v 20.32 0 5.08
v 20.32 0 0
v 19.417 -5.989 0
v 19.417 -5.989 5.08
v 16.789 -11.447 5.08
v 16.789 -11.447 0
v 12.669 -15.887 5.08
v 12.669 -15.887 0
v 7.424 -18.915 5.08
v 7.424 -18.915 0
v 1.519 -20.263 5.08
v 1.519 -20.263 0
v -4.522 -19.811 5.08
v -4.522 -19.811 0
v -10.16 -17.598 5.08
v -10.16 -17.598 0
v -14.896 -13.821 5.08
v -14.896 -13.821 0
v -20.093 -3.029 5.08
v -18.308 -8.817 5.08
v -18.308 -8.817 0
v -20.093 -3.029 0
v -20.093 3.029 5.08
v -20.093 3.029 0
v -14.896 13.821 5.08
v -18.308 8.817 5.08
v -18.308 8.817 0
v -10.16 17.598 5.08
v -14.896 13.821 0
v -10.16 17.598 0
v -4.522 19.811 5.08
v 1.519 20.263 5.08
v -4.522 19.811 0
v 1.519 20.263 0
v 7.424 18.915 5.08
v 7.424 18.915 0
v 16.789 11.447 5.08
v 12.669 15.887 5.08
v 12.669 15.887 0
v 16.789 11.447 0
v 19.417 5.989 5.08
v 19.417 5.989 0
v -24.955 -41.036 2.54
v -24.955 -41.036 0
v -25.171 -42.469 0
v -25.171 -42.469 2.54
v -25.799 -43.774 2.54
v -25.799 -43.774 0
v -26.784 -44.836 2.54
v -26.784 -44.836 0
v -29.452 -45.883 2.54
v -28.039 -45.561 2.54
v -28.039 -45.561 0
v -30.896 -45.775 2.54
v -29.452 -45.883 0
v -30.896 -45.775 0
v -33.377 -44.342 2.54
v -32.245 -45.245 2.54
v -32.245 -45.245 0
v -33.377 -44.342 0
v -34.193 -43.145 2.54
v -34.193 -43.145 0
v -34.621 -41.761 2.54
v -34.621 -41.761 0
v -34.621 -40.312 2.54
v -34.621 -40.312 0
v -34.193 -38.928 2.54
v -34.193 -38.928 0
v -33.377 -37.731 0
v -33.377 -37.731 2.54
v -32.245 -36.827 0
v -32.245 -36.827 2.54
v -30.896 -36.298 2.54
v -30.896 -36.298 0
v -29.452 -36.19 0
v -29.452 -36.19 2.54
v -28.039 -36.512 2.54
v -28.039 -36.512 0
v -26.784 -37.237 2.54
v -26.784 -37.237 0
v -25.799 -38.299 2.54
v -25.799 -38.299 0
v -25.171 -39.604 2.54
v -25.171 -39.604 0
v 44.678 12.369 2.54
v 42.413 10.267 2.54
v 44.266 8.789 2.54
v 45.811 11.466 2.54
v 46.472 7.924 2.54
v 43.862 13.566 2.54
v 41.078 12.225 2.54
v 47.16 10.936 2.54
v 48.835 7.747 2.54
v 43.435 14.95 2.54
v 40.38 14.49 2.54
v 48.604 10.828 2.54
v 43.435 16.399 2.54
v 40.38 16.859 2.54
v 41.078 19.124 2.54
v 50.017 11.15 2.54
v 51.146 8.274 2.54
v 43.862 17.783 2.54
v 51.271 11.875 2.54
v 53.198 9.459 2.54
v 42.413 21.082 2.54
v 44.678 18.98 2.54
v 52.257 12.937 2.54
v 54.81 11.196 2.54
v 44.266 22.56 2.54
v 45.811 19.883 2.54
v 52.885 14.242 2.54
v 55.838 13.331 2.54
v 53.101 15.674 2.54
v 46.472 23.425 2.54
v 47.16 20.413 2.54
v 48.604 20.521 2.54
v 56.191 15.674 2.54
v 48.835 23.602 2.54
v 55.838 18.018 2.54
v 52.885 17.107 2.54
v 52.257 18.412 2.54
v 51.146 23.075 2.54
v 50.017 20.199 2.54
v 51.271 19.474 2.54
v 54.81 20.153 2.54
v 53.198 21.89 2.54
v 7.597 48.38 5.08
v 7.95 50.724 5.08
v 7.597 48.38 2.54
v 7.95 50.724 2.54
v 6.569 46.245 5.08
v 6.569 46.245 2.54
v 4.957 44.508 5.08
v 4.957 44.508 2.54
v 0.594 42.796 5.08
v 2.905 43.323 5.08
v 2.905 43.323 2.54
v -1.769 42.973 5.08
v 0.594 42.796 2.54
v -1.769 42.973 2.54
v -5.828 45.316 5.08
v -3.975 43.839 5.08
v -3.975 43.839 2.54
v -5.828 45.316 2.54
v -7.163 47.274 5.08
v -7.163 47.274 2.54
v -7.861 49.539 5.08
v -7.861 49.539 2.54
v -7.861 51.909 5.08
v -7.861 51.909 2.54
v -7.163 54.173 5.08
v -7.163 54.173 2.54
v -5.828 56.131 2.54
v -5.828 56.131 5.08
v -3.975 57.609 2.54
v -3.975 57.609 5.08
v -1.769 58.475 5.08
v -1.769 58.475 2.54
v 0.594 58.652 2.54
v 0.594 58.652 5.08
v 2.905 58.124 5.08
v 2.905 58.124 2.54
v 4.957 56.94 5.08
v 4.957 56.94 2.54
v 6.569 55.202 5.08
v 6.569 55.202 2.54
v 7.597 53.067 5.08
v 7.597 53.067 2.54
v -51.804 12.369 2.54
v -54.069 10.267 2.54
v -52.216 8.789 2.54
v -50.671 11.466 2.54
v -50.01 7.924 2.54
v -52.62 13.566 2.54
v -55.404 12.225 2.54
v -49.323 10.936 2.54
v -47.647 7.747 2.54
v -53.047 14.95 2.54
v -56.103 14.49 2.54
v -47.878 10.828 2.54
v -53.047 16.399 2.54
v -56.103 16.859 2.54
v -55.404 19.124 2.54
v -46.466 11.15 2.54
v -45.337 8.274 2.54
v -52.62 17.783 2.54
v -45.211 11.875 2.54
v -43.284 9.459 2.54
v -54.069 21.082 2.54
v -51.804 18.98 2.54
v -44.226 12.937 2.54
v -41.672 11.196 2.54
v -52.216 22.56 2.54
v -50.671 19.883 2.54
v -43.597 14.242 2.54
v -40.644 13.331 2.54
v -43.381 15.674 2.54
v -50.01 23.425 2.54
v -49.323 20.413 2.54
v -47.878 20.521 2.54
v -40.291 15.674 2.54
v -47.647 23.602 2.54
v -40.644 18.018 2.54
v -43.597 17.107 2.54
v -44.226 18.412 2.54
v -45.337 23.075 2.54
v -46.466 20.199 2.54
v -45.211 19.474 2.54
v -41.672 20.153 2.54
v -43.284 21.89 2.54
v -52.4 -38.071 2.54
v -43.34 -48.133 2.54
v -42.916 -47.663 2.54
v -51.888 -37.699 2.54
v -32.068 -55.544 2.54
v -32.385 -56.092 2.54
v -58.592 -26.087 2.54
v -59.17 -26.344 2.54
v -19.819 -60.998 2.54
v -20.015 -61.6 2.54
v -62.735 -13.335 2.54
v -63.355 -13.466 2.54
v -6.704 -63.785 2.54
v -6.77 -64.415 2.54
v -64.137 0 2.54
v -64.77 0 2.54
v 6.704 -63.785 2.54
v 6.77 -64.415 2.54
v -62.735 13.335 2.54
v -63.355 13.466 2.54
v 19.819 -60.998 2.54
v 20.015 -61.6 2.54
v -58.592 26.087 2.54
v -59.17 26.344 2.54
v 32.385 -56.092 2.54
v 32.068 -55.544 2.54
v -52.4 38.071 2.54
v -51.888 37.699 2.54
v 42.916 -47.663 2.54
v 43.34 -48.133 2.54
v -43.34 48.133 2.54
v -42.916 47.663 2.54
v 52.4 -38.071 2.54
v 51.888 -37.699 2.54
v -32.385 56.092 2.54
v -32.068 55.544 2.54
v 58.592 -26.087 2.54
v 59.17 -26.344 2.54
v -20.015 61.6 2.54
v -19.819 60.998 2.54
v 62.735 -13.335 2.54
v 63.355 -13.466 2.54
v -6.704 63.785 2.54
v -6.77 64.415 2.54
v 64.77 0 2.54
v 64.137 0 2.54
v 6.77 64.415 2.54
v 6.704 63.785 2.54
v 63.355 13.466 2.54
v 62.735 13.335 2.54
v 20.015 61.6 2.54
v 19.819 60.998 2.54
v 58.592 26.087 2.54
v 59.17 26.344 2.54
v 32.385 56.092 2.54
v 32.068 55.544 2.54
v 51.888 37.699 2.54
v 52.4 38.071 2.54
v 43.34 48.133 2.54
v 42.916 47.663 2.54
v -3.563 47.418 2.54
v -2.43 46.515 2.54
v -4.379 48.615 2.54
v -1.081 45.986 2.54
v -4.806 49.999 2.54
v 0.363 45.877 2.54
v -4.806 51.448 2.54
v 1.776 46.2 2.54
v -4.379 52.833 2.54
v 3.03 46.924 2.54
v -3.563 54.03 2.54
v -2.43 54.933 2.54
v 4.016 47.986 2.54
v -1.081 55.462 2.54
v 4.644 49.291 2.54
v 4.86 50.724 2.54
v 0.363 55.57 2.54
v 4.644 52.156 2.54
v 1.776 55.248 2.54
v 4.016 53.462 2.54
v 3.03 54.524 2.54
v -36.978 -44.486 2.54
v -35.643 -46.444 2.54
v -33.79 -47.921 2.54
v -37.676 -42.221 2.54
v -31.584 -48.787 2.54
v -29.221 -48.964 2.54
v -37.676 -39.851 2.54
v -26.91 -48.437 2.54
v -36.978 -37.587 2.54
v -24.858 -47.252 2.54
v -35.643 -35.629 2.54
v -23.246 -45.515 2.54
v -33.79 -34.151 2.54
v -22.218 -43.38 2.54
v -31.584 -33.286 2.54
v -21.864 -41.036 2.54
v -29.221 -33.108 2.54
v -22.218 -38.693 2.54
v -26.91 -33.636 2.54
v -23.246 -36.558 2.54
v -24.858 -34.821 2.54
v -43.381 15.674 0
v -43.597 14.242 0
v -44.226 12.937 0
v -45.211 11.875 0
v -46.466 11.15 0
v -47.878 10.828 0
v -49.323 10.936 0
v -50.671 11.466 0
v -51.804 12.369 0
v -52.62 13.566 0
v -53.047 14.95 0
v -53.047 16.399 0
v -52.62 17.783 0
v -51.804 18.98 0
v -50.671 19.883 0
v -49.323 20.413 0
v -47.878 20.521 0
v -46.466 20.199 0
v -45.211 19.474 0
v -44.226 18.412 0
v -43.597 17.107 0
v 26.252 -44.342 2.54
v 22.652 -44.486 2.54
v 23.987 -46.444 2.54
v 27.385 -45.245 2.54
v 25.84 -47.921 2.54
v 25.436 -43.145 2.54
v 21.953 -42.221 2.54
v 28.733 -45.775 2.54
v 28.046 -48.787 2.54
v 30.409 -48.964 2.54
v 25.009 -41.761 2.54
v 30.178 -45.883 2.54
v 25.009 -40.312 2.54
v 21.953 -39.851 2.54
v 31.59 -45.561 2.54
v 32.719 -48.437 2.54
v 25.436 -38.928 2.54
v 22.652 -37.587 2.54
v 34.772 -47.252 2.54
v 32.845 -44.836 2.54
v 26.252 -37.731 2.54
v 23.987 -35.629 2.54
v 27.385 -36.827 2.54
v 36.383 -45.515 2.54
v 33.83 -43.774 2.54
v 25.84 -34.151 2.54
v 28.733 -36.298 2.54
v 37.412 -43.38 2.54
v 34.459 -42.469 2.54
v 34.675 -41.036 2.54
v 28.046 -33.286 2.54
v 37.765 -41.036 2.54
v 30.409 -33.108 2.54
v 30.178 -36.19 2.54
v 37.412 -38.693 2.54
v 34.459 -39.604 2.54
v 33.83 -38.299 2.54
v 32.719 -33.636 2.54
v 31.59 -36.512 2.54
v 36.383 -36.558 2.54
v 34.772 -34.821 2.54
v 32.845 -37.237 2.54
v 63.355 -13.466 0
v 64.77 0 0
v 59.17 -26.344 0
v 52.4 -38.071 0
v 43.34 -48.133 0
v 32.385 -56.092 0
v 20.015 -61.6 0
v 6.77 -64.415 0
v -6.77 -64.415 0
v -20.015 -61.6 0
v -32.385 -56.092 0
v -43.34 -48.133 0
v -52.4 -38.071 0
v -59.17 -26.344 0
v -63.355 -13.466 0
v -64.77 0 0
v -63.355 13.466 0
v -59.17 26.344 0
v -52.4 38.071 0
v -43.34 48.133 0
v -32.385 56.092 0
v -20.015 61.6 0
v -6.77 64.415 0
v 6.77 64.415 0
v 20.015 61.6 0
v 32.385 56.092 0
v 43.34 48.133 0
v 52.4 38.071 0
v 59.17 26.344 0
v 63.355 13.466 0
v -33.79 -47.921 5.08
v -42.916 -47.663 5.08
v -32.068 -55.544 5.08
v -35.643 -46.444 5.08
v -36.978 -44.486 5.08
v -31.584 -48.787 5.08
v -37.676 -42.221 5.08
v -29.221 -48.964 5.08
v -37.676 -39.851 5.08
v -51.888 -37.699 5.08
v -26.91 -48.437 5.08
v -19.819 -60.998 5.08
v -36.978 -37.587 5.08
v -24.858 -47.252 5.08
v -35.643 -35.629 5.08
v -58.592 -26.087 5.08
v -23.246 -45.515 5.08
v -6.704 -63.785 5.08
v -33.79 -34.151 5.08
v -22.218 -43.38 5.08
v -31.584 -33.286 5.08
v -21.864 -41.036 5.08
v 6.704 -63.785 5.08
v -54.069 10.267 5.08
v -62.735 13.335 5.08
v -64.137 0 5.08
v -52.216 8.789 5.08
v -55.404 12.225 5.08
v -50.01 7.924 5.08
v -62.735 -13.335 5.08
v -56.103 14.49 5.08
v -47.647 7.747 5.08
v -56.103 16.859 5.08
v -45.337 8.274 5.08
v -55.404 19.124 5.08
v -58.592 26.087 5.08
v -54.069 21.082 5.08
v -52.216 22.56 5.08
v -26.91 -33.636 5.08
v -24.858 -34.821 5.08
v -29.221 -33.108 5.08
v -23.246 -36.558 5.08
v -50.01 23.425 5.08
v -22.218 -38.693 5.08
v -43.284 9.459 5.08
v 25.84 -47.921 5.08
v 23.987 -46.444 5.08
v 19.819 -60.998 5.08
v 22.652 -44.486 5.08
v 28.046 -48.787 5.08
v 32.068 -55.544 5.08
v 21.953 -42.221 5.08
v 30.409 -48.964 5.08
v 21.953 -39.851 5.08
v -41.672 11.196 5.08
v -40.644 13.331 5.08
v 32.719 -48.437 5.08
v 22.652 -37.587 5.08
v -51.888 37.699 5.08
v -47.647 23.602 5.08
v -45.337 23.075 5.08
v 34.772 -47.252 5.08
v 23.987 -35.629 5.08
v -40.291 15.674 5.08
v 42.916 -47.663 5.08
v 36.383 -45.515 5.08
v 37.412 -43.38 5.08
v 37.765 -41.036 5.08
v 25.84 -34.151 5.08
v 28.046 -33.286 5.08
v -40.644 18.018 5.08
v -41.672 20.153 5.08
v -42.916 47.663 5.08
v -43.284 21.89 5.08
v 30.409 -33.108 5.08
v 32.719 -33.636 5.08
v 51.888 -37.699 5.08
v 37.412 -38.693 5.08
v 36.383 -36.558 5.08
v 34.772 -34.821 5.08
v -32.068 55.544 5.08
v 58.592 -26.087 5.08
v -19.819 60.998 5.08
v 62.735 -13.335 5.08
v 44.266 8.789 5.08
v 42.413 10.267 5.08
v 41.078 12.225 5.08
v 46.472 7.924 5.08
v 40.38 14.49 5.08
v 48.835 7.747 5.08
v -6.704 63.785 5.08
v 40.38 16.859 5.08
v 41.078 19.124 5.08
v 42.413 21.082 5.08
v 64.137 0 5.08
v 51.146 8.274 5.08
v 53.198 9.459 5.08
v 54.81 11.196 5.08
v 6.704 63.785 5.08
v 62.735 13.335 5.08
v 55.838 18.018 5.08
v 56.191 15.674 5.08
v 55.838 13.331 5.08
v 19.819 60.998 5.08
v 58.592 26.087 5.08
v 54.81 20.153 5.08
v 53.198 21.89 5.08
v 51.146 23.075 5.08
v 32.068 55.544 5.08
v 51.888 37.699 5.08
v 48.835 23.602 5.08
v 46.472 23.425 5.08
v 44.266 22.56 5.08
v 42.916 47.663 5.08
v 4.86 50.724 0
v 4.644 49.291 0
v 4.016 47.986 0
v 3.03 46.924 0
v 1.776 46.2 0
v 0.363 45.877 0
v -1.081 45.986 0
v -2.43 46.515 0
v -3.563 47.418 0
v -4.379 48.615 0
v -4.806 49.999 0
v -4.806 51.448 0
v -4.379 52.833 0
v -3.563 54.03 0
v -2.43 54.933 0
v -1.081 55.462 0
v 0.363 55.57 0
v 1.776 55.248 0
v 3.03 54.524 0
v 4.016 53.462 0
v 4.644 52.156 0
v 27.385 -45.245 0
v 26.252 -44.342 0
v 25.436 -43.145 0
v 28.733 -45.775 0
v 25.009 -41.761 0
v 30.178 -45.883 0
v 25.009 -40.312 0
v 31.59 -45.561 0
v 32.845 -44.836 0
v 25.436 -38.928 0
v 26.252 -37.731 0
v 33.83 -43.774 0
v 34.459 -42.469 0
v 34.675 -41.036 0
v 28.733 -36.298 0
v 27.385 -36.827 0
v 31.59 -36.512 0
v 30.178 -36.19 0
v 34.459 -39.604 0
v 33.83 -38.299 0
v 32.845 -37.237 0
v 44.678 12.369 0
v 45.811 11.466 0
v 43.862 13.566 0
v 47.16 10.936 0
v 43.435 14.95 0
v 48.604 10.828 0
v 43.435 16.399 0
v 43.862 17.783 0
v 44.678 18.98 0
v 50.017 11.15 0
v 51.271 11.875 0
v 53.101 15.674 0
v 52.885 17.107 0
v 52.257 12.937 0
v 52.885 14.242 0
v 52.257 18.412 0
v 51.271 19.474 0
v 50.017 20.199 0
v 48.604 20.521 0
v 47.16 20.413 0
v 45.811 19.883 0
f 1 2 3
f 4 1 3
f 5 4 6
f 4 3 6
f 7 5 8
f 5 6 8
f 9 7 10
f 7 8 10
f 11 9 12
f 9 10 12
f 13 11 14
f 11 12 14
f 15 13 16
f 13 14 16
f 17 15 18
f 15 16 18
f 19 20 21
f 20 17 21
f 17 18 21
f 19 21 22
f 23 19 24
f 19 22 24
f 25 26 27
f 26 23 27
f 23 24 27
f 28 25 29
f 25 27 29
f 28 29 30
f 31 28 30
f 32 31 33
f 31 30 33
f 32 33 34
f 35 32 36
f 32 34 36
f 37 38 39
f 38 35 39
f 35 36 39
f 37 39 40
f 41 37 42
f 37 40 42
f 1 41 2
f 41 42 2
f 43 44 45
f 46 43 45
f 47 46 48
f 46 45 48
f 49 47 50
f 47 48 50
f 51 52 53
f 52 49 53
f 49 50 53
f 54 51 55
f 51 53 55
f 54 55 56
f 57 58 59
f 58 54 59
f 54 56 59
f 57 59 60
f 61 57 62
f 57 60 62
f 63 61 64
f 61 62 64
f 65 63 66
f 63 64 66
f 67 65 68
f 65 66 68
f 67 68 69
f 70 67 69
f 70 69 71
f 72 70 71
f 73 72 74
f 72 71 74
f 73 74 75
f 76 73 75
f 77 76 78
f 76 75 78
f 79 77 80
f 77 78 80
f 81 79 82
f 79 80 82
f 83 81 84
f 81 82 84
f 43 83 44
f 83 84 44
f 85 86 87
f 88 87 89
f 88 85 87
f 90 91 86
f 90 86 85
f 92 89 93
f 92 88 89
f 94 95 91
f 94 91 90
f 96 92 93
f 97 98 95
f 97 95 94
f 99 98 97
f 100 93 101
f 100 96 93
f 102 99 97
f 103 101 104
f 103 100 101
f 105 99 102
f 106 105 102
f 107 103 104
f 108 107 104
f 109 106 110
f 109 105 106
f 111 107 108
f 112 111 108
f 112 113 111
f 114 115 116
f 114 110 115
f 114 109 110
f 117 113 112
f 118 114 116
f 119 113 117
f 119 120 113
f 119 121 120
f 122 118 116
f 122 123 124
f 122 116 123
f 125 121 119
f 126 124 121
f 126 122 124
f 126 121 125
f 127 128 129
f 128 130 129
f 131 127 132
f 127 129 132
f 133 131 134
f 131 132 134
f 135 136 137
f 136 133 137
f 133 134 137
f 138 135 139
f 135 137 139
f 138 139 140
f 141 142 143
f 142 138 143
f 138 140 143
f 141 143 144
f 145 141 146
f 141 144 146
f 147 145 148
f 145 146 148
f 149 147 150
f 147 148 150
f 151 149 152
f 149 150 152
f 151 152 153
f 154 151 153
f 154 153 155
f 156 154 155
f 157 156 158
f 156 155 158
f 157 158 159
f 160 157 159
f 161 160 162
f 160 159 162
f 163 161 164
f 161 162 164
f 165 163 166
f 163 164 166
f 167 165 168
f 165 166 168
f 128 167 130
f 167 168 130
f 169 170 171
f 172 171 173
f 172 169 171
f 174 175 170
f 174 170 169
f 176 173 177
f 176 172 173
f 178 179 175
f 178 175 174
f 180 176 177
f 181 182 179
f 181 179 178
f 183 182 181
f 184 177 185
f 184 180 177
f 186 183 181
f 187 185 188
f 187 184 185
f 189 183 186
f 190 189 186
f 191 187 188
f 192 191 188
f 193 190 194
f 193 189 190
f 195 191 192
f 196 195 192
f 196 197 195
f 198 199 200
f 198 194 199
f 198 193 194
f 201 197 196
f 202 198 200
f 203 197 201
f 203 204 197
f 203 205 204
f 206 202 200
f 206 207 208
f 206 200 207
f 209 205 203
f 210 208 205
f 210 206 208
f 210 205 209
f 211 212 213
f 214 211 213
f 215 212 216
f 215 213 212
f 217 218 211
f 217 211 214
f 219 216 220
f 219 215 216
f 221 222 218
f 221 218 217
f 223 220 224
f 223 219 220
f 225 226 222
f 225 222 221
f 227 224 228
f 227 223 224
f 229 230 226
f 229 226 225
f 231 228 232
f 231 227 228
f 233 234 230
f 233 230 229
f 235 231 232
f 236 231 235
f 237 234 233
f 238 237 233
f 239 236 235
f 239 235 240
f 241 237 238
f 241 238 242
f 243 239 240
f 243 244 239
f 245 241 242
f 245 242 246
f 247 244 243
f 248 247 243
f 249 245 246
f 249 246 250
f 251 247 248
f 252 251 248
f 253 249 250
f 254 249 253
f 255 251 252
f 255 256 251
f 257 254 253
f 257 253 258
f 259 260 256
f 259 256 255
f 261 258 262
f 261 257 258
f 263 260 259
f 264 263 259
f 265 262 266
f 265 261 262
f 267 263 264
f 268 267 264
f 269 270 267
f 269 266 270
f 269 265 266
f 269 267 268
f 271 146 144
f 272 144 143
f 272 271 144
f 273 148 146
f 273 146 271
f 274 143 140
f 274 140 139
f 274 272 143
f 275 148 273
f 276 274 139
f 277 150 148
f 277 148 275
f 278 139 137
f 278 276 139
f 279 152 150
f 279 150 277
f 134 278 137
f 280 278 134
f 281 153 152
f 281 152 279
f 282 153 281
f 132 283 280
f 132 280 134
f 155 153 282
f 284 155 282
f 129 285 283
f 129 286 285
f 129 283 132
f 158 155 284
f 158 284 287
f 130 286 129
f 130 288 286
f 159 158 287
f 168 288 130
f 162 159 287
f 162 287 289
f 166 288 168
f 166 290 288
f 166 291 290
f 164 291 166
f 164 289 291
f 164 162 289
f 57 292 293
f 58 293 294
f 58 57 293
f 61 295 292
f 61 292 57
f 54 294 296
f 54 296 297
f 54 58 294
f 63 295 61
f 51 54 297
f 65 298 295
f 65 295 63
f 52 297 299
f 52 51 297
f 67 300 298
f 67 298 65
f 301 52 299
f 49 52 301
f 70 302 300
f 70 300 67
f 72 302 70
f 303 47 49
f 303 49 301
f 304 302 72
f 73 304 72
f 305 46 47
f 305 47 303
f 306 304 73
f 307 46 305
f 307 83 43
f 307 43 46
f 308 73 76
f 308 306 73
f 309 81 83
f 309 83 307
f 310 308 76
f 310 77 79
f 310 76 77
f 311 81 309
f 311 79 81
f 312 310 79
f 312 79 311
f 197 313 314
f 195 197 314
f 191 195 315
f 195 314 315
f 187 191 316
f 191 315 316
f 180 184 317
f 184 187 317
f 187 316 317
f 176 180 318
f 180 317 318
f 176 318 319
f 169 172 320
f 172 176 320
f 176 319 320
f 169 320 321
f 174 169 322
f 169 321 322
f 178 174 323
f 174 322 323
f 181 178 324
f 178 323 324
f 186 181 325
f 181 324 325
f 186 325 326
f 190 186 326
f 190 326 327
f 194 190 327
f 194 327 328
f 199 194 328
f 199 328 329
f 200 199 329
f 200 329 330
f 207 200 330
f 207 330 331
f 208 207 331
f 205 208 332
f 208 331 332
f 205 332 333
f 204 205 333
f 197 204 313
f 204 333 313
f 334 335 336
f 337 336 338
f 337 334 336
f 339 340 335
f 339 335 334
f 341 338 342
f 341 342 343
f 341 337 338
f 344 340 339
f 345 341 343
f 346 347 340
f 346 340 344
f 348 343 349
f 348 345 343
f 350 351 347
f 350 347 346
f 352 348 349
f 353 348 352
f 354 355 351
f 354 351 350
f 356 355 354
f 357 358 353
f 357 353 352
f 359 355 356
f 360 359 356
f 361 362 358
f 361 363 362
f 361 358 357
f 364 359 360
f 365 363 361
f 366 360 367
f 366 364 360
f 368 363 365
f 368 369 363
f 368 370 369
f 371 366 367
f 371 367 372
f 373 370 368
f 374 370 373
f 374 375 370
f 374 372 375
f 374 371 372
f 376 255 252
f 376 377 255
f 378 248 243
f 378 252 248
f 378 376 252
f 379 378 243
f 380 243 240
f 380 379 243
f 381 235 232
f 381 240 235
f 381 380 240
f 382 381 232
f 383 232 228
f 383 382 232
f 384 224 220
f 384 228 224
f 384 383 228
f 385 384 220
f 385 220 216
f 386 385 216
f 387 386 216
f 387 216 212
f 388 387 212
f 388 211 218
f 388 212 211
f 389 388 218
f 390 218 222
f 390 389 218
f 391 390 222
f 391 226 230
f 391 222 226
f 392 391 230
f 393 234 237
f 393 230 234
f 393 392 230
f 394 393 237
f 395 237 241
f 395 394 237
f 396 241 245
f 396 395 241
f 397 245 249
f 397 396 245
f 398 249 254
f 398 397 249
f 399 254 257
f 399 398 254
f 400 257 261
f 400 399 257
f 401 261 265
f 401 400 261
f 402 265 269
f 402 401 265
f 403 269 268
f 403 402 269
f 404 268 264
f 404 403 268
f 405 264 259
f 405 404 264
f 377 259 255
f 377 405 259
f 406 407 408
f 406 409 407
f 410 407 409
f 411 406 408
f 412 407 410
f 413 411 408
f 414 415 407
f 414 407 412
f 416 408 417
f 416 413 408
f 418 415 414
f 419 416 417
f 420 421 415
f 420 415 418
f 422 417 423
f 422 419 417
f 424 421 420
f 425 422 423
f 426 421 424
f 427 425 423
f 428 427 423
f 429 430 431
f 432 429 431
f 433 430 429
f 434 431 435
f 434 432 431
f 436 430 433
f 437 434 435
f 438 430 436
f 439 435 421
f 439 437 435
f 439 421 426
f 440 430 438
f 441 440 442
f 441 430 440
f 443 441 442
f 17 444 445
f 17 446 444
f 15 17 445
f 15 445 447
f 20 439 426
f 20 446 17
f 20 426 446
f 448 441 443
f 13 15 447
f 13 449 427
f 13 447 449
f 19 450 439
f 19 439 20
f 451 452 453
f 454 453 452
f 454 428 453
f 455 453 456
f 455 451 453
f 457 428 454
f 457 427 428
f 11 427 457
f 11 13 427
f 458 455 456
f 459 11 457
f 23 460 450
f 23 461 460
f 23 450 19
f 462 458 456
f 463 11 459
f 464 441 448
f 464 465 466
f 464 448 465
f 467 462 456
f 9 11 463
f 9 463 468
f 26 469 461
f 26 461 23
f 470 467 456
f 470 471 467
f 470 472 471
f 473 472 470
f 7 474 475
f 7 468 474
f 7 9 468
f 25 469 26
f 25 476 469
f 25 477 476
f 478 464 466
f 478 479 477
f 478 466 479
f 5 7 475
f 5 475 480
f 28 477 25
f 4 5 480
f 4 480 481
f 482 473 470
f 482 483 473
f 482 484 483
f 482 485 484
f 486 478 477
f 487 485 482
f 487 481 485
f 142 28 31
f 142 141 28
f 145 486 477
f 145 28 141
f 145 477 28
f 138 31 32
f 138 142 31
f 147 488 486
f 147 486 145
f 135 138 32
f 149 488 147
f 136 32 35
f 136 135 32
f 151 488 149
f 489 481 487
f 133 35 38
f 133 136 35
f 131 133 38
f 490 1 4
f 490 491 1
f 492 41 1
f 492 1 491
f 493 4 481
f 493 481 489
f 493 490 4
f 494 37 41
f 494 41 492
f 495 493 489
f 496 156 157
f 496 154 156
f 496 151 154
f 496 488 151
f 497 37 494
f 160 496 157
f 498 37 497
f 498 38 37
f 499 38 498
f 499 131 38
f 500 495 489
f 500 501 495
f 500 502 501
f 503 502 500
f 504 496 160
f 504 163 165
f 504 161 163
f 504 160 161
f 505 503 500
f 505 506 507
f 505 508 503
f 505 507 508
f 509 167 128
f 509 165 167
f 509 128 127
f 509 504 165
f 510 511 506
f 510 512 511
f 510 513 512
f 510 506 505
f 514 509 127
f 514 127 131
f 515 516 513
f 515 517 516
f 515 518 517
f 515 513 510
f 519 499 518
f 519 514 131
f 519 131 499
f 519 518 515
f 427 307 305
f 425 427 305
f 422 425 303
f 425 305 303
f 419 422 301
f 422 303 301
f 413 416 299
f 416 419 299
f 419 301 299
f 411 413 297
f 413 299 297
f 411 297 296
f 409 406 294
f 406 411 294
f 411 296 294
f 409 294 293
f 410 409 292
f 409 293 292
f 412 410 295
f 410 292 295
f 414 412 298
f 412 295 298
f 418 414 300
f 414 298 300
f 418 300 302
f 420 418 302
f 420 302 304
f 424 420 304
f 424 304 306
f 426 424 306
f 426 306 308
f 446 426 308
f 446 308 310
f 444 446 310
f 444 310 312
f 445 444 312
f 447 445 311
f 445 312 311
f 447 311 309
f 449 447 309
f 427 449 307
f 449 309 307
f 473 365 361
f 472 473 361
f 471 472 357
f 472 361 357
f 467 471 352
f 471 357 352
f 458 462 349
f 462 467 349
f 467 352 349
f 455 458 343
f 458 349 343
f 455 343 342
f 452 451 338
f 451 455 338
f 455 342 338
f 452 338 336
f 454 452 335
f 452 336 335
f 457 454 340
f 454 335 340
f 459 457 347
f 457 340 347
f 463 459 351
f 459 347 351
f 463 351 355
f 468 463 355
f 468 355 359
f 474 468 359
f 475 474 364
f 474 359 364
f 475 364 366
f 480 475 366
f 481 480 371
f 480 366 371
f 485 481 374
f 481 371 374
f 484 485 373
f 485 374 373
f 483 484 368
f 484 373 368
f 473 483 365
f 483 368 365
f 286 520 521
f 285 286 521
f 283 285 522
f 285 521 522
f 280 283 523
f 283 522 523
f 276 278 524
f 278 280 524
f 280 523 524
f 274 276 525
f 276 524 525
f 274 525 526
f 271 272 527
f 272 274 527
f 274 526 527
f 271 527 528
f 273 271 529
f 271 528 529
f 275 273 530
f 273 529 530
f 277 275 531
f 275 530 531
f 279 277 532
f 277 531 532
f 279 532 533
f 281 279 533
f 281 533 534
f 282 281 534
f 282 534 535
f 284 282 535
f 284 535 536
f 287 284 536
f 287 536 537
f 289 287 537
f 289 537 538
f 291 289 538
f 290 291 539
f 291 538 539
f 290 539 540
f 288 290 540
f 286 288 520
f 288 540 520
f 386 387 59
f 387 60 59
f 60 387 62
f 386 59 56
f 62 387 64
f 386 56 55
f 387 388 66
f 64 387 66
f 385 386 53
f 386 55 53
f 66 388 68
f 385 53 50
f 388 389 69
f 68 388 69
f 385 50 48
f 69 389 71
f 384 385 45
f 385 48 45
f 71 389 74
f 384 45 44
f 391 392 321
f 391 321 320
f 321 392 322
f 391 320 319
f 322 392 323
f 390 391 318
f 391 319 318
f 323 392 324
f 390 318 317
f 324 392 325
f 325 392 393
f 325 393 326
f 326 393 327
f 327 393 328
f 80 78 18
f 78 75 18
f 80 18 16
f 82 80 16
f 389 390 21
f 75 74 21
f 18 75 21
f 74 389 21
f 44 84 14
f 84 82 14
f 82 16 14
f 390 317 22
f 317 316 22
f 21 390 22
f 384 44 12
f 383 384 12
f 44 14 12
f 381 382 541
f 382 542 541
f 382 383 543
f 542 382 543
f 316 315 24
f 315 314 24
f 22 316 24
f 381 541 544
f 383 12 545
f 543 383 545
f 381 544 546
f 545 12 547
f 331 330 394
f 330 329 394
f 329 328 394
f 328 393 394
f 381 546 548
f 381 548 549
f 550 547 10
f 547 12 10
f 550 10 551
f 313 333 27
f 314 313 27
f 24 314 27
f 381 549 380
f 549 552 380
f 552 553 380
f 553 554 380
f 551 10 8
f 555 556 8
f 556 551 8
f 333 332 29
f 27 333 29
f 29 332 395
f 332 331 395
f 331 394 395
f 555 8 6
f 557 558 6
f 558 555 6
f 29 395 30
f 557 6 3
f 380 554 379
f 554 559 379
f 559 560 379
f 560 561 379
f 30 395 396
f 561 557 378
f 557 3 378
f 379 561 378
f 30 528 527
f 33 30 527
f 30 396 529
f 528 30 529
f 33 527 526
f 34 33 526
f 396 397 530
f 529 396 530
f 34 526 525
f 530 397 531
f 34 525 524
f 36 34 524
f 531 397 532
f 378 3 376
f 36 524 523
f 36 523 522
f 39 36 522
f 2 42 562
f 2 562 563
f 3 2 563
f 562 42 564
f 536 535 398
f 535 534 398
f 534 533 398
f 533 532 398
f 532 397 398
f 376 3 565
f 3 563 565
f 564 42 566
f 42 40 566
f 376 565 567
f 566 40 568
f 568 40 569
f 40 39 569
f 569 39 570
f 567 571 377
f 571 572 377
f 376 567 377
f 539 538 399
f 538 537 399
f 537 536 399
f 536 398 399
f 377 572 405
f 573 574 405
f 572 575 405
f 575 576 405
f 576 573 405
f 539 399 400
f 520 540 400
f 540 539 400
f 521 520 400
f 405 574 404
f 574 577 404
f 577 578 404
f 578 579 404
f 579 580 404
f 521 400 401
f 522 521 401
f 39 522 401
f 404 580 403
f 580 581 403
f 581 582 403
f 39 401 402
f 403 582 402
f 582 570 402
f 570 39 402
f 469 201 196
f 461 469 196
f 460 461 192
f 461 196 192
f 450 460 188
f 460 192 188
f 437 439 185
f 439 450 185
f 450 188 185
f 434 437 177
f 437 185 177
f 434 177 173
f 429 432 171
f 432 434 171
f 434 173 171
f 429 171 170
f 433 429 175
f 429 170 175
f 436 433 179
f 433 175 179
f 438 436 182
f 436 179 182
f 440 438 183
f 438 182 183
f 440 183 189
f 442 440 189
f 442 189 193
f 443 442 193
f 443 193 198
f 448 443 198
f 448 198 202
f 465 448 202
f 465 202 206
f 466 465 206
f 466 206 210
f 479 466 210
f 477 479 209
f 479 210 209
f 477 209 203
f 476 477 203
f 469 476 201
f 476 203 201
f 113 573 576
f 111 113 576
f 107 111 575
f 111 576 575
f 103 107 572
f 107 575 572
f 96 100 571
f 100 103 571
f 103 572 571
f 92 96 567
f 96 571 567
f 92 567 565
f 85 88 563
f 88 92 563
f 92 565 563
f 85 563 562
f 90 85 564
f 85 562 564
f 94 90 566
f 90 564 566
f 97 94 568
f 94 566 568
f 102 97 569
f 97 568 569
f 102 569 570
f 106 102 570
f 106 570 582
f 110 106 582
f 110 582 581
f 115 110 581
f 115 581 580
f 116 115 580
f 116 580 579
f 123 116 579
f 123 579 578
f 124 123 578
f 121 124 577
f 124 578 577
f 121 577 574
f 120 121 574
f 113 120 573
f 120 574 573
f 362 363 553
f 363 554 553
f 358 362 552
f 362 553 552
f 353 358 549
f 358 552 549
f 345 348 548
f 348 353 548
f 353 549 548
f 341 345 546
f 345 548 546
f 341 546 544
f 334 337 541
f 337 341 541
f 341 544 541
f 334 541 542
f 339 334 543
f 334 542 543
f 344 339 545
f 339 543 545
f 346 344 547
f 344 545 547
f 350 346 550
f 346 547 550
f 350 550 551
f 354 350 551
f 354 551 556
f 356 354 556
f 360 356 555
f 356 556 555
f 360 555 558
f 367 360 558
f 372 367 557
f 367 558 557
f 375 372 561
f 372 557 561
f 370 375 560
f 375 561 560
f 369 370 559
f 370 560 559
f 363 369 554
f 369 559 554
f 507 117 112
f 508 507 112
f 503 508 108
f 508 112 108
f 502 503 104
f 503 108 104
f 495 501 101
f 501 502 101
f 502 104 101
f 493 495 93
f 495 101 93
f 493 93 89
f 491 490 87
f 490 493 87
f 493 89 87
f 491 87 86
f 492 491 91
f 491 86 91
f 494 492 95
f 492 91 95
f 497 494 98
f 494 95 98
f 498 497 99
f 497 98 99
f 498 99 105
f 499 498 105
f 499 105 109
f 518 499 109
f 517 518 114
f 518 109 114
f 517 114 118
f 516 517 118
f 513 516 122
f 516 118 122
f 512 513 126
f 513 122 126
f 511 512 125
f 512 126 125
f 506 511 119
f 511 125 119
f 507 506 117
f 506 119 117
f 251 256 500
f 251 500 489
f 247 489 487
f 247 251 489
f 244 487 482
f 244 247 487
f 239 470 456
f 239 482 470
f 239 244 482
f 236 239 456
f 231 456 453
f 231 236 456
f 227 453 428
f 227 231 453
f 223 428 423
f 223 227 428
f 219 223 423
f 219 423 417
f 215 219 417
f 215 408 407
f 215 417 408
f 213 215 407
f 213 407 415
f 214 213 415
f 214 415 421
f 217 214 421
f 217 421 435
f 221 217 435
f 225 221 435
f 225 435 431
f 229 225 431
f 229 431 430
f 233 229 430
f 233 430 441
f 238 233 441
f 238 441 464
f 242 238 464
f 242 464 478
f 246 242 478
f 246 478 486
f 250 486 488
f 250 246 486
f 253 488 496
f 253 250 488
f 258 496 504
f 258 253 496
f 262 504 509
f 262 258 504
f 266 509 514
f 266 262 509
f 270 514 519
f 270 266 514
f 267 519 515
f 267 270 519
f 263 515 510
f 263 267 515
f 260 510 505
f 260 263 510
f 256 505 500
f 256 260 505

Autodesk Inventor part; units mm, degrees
ref_plane "YZ Plane" through (0, 0, 0) normal (1, 0, 0) x (0, 1, 0)
ref_plane "XZ Plane" through (0, 0, 0) normal (0, 1, 0) x (-1, 0, 0)
ref_plane "XY Plane" through (0, 0, 0) normal (0, 0, 1) x (1, 0, 0)
sketch "Sketch1" plane through (0, 0, 0) normal (0, 0, 1) x (1, 0, 0)
  circle A0 centre (0, 0) radius 20.32
  circle A1 centre (0, 0) radius 64.77
  circle A2 centre (0, 50.7238) radius 4.8601
  circle A3 centre (-48.2412, 15.6745) radius 4.8601
  circle A4 centre (-29.8147, -41.0364) radius 4.8601
  circle A5 centre (29.8147, -41.0364) radius 4.8601
  circle A6 centre (48.2412, 15.6745) radius 4.8601
  dimension "d0" = 40.64
  dimension "d1" = 129.54
  dimension "d2" = 50.7238
  dimension "d5" = 360
extrude "Extrusion1" add sketch "Sketch1" along normal blind 2.54
sketch "Sketch2" plane through (0, 0, 2.54) normal (0, 0, 1) x (1, 0, 0)
  circle A0 centre (0, 0) radius 20.32 projected
  circle A1 centre (0, 0) radius 20.32
  circle A2 centre (0, 0) radius 64.1368
  circle A3 centre (0, 50.7238) radius 4.8601 projected
  circle A4 centre (0, 50.7238) radius 7.9502
  circle A5 centre (-48.2412, 15.6745) radius 7.9502
  circle A6 centre (-29.8147, -41.0364) radius 7.9502
  circle A7 centre (29.8147, -41.0364) radius 7.9502
  circle A8 centre (48.2412, 15.6745) radius 7.9502
  dimension "d9" = 15.9004
  dimension "d12" = 360
extrude "Extrusion2" add sketch "Sketch2" along normal blind 2.54 contours A2
properties part number "Savior Paddle Template"
